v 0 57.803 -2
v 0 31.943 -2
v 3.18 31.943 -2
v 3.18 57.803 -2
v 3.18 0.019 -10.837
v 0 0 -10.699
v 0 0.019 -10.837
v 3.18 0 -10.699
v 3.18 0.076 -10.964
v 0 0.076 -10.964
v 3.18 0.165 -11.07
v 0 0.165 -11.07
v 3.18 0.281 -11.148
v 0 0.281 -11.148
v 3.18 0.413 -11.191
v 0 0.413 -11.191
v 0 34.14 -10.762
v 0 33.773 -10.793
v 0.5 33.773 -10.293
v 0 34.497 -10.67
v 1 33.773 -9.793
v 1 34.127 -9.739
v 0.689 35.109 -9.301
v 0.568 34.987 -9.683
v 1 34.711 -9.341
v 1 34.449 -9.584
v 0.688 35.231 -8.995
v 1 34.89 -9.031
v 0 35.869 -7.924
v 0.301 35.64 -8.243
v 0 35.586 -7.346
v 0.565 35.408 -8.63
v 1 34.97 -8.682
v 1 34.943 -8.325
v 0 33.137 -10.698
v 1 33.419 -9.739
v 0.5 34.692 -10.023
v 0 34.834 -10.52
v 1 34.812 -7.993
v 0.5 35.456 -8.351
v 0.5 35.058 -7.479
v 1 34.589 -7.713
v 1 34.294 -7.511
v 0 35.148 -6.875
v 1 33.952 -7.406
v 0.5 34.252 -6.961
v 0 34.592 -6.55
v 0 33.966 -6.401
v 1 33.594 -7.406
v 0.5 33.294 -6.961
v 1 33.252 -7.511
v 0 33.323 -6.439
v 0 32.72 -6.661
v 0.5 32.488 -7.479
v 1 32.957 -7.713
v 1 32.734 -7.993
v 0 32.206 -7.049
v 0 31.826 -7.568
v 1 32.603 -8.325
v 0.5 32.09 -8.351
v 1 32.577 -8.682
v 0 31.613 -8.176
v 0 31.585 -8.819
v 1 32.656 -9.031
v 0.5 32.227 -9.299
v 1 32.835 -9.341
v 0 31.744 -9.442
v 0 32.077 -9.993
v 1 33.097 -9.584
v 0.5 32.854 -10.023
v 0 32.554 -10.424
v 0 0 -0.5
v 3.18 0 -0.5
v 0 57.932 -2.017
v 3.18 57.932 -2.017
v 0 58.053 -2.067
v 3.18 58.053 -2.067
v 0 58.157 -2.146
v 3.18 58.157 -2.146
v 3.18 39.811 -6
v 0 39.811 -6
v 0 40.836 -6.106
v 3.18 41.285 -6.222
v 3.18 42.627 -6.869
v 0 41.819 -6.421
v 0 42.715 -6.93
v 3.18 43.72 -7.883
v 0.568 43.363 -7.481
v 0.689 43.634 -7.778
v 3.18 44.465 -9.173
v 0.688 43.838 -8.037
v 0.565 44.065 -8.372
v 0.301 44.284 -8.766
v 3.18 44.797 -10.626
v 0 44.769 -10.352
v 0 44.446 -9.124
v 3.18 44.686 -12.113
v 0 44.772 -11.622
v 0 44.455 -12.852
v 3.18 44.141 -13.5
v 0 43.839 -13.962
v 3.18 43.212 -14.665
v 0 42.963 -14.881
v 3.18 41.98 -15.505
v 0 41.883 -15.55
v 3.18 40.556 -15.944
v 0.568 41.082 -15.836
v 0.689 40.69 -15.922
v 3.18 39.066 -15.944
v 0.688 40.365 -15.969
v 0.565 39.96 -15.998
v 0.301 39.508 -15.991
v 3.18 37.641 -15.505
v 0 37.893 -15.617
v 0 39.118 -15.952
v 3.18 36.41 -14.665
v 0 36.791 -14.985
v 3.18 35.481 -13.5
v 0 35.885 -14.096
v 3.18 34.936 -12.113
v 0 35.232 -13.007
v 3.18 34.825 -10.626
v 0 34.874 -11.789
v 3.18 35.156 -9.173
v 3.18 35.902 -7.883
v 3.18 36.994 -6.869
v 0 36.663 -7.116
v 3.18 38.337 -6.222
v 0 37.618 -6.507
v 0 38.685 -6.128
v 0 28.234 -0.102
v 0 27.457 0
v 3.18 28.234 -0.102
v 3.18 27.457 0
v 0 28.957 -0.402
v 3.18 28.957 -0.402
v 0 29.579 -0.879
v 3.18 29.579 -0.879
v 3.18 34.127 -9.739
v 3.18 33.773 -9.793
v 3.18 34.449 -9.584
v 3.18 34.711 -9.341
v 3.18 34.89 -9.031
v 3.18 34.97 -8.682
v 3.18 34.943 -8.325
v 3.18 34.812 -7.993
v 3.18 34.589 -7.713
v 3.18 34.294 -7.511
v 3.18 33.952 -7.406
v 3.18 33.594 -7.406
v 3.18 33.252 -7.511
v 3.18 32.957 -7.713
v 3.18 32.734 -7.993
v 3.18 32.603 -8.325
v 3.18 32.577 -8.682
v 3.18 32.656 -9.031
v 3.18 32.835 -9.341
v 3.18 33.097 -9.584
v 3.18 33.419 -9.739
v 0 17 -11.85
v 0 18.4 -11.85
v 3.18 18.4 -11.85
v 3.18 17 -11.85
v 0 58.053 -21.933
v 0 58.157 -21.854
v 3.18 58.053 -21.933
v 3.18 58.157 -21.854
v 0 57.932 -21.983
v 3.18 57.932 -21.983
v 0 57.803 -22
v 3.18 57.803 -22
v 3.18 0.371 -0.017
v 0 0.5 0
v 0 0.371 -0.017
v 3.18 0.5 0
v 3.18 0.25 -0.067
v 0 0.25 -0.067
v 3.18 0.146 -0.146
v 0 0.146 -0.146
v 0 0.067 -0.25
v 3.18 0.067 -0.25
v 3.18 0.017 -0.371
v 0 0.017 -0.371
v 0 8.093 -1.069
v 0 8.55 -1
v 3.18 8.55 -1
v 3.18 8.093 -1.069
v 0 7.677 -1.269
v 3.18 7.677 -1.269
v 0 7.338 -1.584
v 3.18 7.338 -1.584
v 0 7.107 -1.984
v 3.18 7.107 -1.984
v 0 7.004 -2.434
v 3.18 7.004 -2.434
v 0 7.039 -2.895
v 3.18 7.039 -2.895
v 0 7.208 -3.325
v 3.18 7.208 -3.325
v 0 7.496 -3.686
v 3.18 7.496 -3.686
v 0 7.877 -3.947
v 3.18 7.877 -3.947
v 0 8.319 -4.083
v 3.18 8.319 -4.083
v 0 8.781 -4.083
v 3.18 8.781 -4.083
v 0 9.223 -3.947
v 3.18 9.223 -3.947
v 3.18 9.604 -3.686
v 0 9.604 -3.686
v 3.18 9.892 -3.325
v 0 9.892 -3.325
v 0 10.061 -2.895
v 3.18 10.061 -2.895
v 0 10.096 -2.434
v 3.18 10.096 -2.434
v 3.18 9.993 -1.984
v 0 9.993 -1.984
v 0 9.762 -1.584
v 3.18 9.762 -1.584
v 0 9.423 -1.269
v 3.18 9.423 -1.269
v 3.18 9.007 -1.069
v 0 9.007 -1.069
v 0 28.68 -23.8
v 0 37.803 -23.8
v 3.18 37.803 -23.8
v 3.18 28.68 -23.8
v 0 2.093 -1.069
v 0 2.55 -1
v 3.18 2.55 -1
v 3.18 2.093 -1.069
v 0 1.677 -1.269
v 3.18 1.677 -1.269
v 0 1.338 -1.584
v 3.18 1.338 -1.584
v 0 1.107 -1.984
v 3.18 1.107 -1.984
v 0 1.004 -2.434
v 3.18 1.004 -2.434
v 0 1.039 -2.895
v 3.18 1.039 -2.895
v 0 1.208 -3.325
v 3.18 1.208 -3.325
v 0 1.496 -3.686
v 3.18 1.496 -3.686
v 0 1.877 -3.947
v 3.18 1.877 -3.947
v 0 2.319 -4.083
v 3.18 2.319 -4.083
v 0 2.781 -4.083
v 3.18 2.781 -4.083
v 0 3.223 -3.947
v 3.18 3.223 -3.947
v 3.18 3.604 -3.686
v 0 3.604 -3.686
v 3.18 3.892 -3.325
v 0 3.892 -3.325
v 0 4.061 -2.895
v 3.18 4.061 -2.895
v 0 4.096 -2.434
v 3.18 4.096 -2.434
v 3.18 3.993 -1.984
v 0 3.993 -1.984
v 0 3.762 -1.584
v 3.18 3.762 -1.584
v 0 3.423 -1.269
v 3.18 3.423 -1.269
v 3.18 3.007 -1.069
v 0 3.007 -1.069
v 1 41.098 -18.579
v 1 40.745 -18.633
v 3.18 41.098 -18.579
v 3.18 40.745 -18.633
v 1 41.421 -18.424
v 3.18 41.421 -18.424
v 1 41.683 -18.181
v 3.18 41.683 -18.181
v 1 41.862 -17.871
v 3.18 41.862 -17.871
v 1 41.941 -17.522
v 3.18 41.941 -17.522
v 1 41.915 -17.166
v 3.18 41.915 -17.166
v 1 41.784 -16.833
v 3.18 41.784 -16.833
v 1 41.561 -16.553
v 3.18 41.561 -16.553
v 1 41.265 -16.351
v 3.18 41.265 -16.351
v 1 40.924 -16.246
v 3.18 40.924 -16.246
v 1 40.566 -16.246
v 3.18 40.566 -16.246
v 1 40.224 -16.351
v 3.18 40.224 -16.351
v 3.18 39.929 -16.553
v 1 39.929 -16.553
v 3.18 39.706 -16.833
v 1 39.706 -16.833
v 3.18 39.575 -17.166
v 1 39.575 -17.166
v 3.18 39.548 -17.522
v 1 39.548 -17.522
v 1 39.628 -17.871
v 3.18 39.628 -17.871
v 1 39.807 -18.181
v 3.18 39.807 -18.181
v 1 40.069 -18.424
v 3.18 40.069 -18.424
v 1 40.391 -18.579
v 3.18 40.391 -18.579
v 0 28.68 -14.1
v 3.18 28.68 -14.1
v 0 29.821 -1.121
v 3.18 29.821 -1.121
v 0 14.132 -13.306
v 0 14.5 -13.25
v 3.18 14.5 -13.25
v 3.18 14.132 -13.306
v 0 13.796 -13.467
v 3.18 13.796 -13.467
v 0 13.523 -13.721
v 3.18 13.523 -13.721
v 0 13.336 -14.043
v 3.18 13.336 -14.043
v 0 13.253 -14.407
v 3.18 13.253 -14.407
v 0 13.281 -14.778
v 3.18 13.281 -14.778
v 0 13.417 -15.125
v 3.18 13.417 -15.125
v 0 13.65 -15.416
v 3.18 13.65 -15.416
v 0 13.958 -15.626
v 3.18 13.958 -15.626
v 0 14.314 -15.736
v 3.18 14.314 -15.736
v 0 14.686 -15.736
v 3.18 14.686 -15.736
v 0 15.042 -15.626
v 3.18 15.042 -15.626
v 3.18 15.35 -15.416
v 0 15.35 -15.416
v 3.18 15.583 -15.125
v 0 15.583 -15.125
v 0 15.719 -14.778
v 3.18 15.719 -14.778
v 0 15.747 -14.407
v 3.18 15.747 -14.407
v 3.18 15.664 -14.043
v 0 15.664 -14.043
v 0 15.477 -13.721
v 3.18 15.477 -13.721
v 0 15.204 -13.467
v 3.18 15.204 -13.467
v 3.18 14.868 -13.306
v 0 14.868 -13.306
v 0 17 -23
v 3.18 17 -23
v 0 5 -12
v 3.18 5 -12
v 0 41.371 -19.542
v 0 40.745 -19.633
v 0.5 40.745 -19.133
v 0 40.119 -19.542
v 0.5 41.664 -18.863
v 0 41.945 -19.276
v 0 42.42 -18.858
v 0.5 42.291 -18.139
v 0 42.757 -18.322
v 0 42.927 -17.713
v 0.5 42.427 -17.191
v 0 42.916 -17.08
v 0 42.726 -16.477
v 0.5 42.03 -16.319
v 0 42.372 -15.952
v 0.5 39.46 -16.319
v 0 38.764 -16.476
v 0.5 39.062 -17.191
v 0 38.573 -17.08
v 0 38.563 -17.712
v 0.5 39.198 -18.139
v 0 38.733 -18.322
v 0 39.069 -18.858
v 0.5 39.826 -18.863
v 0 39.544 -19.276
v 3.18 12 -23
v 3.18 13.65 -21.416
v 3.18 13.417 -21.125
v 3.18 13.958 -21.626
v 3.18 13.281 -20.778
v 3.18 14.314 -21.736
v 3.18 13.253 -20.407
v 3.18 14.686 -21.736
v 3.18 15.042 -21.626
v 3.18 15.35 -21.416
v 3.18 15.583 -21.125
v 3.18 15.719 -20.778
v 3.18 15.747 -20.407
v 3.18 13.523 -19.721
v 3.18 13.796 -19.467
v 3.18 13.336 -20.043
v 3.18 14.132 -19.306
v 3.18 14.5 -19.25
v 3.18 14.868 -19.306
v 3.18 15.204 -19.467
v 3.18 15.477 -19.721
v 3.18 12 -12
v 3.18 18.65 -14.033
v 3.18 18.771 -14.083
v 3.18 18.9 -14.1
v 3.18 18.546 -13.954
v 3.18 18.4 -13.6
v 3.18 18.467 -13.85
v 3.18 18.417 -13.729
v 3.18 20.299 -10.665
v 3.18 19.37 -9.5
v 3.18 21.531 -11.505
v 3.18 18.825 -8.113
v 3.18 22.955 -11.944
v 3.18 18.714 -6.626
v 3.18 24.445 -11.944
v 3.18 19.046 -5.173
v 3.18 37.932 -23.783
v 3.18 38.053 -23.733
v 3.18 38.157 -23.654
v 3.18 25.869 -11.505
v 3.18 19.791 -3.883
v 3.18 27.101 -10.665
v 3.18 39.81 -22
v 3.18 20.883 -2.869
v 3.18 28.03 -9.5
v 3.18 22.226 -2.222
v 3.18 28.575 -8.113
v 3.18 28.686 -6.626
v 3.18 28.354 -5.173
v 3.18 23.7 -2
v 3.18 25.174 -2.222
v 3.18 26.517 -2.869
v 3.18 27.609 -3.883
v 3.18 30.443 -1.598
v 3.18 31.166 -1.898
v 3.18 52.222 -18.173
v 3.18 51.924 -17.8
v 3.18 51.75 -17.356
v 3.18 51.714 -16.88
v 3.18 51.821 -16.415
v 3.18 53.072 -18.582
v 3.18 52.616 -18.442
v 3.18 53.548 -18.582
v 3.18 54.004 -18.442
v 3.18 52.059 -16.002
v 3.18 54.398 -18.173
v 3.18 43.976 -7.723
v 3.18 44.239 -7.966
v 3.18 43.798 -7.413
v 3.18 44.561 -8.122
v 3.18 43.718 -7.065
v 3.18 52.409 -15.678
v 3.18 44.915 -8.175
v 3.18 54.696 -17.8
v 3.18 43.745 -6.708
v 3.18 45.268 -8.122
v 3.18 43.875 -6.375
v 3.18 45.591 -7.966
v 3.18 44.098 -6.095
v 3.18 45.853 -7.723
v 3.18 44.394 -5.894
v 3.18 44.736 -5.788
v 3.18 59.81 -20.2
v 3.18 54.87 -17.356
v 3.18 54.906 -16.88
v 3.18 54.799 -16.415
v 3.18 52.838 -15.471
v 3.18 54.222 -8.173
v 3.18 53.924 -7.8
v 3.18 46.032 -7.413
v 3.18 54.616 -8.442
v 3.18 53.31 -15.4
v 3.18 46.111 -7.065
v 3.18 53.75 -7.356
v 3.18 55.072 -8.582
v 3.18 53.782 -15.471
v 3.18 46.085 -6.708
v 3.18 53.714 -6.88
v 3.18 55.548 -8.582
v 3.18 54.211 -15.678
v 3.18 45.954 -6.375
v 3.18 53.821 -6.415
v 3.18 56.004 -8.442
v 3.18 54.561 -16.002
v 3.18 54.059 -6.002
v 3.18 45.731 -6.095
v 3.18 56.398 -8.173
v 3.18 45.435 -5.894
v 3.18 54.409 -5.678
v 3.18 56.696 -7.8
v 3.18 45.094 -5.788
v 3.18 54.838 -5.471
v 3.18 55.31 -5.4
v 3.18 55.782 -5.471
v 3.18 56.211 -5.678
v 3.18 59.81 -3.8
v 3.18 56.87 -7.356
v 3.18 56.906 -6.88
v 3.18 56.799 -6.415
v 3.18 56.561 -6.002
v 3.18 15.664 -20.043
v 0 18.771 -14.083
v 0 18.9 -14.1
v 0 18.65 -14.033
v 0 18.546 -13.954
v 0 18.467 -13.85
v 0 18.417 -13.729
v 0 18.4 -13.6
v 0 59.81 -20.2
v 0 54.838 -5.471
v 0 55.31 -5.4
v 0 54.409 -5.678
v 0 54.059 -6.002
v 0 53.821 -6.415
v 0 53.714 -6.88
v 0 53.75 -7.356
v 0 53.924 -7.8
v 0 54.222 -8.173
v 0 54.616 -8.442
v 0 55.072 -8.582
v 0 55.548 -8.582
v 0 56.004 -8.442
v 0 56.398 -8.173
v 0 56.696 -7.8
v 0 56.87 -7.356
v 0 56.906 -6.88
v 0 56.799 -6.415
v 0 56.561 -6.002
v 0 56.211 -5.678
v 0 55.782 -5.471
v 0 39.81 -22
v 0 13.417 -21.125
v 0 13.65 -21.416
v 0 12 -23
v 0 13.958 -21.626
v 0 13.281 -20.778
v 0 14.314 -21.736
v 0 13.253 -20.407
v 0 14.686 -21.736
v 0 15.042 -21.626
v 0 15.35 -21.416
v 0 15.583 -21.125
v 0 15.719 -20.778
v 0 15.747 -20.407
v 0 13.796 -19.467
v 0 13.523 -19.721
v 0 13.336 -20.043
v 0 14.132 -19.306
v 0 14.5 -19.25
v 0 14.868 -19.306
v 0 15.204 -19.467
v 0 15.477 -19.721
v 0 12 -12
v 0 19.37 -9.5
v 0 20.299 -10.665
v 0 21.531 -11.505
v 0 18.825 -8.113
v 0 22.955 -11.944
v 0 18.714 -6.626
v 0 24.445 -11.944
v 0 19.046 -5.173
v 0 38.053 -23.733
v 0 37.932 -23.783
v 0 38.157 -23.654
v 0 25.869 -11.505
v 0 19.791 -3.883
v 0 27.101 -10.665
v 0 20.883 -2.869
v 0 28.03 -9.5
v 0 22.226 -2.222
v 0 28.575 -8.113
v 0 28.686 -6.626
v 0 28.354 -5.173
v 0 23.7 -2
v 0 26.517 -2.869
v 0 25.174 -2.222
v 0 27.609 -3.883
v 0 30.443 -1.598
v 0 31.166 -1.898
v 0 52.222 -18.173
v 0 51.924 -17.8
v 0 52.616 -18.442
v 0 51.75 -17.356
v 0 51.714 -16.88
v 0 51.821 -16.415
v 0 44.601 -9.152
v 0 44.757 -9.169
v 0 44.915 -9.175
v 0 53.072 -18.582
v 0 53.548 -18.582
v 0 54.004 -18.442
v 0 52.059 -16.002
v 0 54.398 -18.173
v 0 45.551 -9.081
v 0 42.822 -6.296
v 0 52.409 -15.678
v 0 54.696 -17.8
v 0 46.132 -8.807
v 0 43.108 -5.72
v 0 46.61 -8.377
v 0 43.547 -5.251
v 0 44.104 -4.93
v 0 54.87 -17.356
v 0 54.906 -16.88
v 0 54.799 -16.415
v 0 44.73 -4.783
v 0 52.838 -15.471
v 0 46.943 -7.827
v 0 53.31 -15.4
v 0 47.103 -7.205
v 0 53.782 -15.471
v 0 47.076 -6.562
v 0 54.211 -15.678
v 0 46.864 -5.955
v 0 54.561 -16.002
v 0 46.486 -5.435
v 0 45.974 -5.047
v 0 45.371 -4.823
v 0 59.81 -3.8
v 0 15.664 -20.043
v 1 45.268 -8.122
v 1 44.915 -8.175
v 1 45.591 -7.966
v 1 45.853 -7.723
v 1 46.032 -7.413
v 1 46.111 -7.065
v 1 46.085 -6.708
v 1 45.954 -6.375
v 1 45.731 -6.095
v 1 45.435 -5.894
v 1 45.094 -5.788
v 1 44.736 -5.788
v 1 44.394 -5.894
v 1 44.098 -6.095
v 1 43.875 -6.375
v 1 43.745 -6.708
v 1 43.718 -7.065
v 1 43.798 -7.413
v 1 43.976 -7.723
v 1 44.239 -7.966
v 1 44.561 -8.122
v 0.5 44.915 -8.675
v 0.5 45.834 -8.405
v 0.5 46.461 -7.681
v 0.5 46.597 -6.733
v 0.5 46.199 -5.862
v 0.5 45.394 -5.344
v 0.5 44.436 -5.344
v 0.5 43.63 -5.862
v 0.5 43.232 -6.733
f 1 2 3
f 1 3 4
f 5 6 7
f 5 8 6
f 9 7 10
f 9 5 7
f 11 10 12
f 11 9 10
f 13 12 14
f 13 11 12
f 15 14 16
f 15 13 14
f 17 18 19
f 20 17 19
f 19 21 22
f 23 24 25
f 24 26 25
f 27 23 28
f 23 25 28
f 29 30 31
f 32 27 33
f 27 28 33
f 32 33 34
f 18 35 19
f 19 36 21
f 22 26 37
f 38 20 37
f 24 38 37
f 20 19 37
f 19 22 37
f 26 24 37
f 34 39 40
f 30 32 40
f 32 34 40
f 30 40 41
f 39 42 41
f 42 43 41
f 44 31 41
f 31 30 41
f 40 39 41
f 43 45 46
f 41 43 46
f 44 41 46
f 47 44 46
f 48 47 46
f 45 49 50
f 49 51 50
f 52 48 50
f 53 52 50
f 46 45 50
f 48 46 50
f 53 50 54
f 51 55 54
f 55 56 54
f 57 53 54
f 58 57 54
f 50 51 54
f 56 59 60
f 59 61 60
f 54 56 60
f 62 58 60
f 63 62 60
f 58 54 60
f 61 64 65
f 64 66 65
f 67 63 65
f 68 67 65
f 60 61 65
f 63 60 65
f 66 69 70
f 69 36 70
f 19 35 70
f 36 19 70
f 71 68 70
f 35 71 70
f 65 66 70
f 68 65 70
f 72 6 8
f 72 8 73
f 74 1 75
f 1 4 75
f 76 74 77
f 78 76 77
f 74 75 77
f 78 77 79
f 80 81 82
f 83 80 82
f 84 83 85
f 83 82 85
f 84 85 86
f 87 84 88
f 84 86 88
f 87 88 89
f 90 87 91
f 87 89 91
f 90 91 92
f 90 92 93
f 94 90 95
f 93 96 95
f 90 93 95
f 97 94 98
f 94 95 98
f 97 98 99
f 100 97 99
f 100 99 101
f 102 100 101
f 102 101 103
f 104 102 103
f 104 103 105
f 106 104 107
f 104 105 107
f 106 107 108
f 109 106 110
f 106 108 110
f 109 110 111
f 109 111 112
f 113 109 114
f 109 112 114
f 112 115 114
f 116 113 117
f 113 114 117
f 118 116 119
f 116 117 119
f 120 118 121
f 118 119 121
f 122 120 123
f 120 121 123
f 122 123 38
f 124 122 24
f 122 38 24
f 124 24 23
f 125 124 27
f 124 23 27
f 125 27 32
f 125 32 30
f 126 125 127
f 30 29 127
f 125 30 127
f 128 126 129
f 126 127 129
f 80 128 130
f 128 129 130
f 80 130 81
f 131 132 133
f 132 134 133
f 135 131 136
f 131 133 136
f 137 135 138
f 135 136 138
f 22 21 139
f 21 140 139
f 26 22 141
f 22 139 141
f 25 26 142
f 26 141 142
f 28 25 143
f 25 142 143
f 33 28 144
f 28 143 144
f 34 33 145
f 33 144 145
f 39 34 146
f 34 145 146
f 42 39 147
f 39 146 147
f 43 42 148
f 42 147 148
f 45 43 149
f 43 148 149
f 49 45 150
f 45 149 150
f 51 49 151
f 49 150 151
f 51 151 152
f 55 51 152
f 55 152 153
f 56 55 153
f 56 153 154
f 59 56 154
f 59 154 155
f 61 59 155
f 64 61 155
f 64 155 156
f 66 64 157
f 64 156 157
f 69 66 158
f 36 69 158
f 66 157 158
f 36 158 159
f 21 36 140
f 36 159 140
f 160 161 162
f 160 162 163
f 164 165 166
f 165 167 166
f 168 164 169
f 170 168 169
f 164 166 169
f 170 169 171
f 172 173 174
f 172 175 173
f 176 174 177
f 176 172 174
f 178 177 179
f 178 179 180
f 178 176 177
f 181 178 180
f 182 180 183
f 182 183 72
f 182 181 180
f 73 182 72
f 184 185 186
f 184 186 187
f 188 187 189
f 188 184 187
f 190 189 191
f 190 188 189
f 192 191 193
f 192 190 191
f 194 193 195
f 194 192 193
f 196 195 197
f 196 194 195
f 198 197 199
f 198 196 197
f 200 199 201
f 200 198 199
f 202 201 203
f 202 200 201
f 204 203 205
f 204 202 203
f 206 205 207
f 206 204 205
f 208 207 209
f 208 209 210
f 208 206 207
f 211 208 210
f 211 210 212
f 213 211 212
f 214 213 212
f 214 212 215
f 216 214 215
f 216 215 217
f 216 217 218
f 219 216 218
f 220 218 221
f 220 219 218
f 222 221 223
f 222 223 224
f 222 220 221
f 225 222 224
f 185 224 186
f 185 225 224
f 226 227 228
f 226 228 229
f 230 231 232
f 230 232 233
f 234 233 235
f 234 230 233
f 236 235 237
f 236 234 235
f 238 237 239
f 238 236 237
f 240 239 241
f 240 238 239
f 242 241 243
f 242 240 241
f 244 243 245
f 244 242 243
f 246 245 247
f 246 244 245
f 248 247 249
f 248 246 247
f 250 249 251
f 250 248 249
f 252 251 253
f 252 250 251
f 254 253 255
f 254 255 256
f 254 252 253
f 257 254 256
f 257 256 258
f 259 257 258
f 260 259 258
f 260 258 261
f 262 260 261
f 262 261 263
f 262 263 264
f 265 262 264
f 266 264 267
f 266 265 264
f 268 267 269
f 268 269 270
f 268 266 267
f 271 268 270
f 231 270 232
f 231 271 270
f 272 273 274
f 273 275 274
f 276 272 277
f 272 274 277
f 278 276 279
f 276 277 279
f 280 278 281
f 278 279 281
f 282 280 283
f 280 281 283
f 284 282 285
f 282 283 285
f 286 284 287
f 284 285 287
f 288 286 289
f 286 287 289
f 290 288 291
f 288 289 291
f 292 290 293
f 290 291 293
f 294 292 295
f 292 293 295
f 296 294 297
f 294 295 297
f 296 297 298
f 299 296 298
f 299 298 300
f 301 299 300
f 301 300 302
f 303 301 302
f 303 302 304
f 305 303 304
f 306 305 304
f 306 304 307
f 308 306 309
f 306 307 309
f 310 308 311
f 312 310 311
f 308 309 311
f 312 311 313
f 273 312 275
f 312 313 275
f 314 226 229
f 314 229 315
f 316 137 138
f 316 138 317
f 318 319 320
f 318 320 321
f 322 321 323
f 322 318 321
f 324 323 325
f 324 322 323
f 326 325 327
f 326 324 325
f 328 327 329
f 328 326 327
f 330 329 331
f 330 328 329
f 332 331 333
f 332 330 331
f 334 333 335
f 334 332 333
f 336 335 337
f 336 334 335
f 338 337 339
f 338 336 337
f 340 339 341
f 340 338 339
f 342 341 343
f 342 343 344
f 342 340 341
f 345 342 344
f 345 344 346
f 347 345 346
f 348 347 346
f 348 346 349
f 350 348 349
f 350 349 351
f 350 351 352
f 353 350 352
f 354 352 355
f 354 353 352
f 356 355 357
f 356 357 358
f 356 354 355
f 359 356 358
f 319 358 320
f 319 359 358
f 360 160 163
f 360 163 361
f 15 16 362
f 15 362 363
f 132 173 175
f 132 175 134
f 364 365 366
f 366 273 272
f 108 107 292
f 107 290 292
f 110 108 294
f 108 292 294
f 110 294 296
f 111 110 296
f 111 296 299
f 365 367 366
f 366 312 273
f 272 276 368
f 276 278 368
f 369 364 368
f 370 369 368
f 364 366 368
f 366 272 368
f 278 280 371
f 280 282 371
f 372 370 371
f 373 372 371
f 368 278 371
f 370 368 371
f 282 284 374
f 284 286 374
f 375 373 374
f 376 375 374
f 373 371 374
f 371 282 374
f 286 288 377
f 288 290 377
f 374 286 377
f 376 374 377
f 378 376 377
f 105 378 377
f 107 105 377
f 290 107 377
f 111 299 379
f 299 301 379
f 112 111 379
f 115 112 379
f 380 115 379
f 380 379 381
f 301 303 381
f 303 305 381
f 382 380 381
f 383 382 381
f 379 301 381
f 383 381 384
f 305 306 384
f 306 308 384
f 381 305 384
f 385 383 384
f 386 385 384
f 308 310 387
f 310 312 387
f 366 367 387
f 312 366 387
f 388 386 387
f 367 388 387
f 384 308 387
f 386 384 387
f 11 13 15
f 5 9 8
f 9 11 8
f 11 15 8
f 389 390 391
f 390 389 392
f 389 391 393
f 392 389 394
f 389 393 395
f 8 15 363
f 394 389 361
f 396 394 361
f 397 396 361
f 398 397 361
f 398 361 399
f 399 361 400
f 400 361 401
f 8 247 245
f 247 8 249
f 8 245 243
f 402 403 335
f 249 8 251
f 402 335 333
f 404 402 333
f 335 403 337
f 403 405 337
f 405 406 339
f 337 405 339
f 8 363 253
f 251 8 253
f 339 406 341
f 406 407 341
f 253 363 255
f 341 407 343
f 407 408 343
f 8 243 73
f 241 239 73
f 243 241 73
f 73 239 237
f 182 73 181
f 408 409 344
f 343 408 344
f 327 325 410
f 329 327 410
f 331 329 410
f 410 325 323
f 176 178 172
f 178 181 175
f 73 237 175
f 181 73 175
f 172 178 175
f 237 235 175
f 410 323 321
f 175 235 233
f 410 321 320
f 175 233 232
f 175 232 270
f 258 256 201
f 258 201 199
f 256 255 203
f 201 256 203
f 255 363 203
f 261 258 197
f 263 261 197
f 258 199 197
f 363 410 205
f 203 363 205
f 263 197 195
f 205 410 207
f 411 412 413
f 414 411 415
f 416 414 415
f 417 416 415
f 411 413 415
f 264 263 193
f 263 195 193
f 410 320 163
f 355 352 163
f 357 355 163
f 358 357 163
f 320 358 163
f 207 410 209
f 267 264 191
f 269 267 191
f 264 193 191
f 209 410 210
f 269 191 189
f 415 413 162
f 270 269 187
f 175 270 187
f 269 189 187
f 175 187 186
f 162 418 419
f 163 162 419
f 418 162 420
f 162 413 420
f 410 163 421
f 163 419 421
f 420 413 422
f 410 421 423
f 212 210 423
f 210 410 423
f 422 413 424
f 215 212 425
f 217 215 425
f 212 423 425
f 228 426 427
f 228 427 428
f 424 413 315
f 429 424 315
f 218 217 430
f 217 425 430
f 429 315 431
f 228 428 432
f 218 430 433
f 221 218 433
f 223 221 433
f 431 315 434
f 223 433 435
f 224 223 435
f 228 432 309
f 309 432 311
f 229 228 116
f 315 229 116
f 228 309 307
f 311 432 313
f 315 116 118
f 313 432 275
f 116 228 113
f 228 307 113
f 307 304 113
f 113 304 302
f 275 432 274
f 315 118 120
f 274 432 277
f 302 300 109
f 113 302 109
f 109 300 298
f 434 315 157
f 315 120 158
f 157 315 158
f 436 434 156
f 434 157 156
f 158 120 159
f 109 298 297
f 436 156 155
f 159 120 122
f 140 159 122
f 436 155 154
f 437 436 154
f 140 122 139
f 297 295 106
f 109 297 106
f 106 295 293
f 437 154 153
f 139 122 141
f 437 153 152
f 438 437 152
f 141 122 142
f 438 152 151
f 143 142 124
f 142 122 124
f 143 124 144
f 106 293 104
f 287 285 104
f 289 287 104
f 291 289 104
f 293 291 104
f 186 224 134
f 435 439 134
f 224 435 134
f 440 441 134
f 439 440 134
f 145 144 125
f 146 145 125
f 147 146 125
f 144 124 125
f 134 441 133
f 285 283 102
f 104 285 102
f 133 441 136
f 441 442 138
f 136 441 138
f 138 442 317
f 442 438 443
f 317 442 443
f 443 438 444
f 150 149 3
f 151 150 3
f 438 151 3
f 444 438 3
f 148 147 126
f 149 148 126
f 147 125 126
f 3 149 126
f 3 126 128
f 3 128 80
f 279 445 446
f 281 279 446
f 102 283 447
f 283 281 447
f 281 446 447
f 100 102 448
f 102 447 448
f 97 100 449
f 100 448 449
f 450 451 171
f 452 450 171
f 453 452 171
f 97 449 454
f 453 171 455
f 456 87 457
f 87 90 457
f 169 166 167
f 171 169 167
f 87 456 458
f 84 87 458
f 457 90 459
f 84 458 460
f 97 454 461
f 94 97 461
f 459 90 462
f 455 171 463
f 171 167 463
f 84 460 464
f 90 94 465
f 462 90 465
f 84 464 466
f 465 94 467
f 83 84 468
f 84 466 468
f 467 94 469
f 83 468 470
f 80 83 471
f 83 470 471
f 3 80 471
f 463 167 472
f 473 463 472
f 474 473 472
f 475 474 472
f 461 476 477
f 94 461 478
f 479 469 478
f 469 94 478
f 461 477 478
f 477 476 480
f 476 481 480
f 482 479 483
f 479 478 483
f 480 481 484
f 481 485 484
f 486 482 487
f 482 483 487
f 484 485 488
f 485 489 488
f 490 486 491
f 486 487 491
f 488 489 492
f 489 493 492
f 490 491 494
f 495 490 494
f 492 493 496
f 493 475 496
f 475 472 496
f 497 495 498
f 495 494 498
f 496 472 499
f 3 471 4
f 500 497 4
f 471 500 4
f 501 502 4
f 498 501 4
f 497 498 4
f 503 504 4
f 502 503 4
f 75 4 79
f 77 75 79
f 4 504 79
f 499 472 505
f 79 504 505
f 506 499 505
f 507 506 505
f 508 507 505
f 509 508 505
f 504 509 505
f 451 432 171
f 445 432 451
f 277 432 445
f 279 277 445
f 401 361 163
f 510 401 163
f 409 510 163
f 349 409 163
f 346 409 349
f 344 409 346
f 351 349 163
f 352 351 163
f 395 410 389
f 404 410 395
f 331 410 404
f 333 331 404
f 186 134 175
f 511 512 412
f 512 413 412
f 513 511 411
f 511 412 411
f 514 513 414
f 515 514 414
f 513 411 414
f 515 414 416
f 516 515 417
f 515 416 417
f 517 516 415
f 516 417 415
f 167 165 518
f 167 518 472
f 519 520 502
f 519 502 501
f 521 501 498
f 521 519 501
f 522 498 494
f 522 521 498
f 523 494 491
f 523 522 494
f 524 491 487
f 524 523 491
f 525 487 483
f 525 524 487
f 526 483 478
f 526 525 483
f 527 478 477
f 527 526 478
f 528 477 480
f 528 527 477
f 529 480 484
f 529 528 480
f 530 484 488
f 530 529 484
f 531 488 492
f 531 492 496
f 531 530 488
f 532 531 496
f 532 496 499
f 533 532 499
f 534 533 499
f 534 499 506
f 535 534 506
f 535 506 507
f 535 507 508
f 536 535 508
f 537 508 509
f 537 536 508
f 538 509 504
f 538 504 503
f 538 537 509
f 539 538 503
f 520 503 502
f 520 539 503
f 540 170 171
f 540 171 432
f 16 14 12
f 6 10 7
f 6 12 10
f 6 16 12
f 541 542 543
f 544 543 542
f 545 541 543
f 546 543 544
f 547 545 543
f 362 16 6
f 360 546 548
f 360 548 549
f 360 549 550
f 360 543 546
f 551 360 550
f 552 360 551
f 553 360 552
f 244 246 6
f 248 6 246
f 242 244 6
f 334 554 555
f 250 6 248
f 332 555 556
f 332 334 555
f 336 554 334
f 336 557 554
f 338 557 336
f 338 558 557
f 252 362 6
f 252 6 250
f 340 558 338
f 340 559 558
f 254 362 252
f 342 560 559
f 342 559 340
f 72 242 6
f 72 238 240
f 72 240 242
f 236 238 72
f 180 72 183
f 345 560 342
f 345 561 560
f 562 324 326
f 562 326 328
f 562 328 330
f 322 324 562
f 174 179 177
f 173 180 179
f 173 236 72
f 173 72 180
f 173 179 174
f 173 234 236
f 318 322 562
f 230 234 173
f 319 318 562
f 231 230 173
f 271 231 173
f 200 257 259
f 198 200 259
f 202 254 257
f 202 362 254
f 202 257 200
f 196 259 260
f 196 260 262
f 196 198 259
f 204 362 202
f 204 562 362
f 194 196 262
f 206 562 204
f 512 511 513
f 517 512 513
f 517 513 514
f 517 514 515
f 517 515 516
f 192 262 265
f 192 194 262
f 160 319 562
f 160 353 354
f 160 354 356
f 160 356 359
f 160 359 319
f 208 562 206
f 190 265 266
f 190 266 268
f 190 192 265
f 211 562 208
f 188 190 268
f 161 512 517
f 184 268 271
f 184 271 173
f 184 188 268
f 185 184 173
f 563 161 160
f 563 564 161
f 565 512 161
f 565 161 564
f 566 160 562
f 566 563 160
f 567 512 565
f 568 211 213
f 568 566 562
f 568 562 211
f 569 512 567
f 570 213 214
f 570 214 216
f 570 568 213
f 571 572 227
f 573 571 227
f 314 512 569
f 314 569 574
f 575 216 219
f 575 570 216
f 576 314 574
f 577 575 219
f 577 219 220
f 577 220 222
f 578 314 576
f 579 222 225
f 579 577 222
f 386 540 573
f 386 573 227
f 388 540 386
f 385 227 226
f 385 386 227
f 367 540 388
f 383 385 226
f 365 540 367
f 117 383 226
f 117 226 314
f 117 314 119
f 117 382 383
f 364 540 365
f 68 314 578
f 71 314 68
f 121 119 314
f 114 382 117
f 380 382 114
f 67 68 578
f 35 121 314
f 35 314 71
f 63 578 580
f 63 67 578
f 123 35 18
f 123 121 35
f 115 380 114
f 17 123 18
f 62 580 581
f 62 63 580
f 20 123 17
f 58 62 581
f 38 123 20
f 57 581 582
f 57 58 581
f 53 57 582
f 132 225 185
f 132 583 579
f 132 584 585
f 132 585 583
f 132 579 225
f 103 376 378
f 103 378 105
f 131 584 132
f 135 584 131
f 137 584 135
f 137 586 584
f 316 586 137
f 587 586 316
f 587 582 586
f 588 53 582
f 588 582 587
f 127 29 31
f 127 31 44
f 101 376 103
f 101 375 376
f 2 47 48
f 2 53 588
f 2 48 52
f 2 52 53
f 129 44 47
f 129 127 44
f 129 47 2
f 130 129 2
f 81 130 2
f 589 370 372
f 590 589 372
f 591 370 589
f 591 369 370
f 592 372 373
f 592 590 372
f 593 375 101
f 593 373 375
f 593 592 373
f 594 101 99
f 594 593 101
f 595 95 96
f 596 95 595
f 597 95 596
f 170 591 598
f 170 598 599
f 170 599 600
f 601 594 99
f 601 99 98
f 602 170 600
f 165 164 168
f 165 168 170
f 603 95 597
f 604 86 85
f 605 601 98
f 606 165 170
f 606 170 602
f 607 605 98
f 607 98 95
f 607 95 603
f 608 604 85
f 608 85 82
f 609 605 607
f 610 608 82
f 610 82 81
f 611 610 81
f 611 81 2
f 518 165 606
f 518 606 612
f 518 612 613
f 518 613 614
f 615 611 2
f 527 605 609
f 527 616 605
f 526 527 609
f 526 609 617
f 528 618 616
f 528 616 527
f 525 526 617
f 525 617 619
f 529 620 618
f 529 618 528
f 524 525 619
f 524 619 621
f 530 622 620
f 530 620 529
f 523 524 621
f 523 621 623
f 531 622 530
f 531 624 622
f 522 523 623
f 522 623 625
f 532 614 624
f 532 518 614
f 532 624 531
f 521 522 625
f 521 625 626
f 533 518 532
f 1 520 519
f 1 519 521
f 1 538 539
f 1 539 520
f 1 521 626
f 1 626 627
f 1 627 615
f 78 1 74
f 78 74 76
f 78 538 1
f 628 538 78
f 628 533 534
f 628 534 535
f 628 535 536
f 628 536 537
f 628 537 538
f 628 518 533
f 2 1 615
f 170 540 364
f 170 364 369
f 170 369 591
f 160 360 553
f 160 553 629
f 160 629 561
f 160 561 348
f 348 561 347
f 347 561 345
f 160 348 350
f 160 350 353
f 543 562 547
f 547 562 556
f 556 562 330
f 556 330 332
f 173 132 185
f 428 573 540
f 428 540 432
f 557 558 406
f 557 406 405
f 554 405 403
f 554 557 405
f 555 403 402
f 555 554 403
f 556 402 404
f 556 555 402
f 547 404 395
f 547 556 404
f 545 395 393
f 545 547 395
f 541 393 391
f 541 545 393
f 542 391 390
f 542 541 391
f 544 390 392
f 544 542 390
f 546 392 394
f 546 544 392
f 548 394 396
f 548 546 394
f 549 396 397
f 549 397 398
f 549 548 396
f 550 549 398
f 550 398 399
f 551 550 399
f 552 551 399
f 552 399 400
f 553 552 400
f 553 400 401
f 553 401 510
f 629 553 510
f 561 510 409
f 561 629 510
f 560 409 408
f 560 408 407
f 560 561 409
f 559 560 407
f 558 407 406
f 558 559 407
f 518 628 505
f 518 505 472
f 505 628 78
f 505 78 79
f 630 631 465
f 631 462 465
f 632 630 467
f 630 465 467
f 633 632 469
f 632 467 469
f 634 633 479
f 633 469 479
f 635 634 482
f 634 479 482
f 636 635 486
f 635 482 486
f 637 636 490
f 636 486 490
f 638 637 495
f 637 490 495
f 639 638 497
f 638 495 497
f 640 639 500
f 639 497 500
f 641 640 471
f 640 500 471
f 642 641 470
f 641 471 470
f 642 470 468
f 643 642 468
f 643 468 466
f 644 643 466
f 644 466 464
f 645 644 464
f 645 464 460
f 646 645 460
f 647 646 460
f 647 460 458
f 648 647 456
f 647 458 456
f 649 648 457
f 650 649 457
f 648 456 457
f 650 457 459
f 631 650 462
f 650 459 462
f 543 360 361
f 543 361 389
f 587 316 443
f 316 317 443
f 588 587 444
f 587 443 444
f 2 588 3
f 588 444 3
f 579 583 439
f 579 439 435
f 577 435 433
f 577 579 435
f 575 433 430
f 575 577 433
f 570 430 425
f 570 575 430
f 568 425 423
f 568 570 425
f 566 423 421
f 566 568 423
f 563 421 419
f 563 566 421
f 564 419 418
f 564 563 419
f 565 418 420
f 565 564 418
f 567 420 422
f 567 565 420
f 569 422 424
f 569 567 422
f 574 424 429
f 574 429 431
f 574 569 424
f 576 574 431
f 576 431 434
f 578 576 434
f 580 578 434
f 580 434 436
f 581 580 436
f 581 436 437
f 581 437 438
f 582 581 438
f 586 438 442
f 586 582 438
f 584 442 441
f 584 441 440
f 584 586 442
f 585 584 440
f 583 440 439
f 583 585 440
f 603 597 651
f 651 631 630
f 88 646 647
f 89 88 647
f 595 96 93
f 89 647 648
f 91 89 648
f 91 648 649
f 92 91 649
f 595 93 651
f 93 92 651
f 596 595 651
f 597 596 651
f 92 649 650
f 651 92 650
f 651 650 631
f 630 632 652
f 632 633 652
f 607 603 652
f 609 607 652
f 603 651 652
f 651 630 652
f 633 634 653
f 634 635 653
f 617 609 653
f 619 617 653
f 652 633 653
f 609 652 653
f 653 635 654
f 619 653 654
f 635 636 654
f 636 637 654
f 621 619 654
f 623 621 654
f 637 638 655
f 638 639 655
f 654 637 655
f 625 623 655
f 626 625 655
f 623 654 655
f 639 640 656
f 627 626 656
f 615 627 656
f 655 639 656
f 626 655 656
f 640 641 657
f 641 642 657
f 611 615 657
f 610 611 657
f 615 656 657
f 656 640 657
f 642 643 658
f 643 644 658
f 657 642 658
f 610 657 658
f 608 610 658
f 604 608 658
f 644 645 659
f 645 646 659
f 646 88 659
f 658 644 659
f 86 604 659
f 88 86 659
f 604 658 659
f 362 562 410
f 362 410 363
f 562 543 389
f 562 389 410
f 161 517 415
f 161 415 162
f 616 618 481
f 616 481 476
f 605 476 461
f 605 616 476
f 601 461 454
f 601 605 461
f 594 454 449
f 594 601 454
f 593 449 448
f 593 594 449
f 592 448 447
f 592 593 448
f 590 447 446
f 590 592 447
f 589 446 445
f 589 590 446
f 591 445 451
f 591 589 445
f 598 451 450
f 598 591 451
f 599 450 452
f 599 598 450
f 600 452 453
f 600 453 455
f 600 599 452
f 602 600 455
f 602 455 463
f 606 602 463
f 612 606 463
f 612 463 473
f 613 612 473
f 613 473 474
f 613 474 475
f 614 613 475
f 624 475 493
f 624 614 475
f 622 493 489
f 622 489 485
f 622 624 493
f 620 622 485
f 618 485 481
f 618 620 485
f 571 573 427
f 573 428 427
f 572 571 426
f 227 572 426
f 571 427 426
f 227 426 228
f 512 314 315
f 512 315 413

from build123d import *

# Parameters (mm, degrees)
SKETCH1_R                                       = 5
SKETCH1_R_2                                     = 1.6
SKETCH1_R_3                                     = 1.25
SKETCH1_R_4                                     = 1.55
BOSS_EXTRUDE1_DEPTH                             = 3.18
CHAMFER1_SIZE                                   = 5
CHAMFER1_SIZE2                                  = 0.881634904
CSK_FOR_M2_FLAT_HEAD_MACHINE_SCREW1_D           = 2.4
CSK_FOR_M2_FLAT_HEAD_MACHINE_SCREW1_DEPTH       = 3.508967257
CSK_FOR_M2_FLAT_HEAD_MACHINE_SCREW1_CSINK_D     = 4.4
CSK_FOR_M2_FLAT_HEAD_MACHINE_SCREW1_CSINK_ANGLE = 90
CSK_FOR_M2_FLAT_HEAD_MACHINE_SCREW1_TIP         = 0.721032743
SKETCH3_R                                       = 5
CUT_EXTRUDE4_DEPTH                              = 65.449891389
FILLET2_R                                       = 3
CHAMFER2_SIZE                                   = 1.8
FILLET4_R                                       = 0.5


with BuildPart() as part:
    # Sketch1 → Boss-Extrude1 (new body)
    with BuildSketch(Plane(origin=(0, 0, 0), x_dir=(0, 0, -1), z_dir=(1, 0, 0))):
        Polygon((0, 0), (0, 28.7), (2, 30.7), (2, 59.81), (22, 59.81), (22, 39.81), (23.8, 39.81), (23.8, 28.68), (14.1, 28.68), (14.1, 18.4), (11.85, 18.4), (11.85, 17), (23, 17), (23, 12), (12, 12), (12, 0), align=None)
        with Locations(Location((7, 23.7, 0), (0, 0, 180))):
            Circle(SKETCH1_R, mode=Mode.SUBTRACT)
        with Locations(Location((7, 55.31, 0), (0, 0, 180))):
            Circle(SKETCH1_R_2, mode=Mode.SUBTRACT)
        with Locations(Location((17, 53.31, 0), (0, 0, 180))):
            Circle(SKETCH1_R_2, mode=Mode.SUBTRACT)
        with Locations(Location((20.5, 14.5, 0), (0, 0, 180))):
            Circle(SKETCH1_R_3, mode=Mode.SUBTRACT)
        with Locations(Location((14.5, 14.5, 0), (0, 0, 180))):
            Circle(SKETCH1_R_3, mode=Mode.SUBTRACT)
        with Locations(Location((2.55, 2.55, 0), (0, 0, 180))):
            Circle(SKETCH1_R_4, mode=Mode.SUBTRACT)
        with Locations(Location((2.55, 8.55, 0), (0, 0, 180))):
            Circle(SKETCH1_R_4, mode=Mode.SUBTRACT)
    extrude(amount=BOSS_EXTRUDE1_DEPTH)

    # Chamfer1
    chamfer1_edges = [part.edges().sort_by_distance(p)[0] for p in [
        (1.59, 0, -12),
    ]]
    chamfer1_side = [part.faces().sort_by_distance(p)[0] for p in [
        (1.59, 6, -12),
    ]]
    chamfer(chamfer1_edges, length=CHAMFER1_SIZE, length2=CHAMFER1_SIZE2, reference=chamfer1_side[0])

    # CSK for M2 Flat Head Machine Screw1
    with Locations(Plane.ZY):
        with Locations((-6.974936087, 44.914674329), (-17.432559713, 40.744769284), (-8.592504199, 33.773154083)):
            CounterSinkHole(CSK_FOR_M2_FLAT_HEAD_MACHINE_SCREW1_D / 2, CSK_FOR_M2_FLAT_HEAD_MACHINE_SCREW1_CSINK_D / 2, depth=CSK_FOR_M2_FLAT_HEAD_MACHINE_SCREW1_DEPTH, counter_sink_angle=CSK_FOR_M2_FLAT_HEAD_MACHINE_SCREW1_CSINK_ANGLE)
            with Locations((0, 0, -(CSK_FOR_M2_FLAT_HEAD_MACHINE_SCREW1_DEPTH + CSK_FOR_M2_FLAT_HEAD_MACHINE_SCREW1_TIP / 2))):  # 118° drill point
                Cone(0, CSK_FOR_M2_FLAT_HEAD_MACHINE_SCREW1_D / 2, CSK_FOR_M2_FLAT_HEAD_MACHINE_SCREW1_TIP, mode=Mode.SUBTRACT)

    # Sketch3 → Cut-Extrude4 (cut, through all)
    with BuildSketch(Plane.ZY):
        with Locations((-11, 39.810865899)):
            Circle(SKETCH3_R)
    extrude(amount=-CUT_EXTRUDE4_DEPTH, mode=Mode.SUBTRACT)

    # Fillet2
    fillet2_edges = [part.edges().sort_by_distance(p)[0] for p in [
        (1.59, 28.7, 0),
        (1.59, 30.7, -2),
    ]]
    fillet(fillet2_edges, radius=FILLET2_R)

    # Chamfer2
    chamfer2_edges = [part.edges().sort_by_distance(p)[0] for p in [
        (1.59, 59.81, -22),
        (1.59, 59.81, -2),
        (1.59, 39.81, -23.8),
    ]]
    chamfer(chamfer2_edges, length=CHAMFER2_SIZE - 0.0001)  # a hair under: the kernel refuses the full size

    # Fillet4
    fillet4_edges = [part.edges().sort_by_distance(p)[0] for p in [
        (1.59, 38.0101, -23.8),
        (1.59, 58.0101, -22),
        (1.59, 58.0101, -2),
        (1.59, 0, 0),
        (1.59, 18.4, -14.1),
        (1.59, 0, -11.118365096),
    ]]
    fillet(fillet4_edges, radius=FILLET4_R)


solid = part.part
